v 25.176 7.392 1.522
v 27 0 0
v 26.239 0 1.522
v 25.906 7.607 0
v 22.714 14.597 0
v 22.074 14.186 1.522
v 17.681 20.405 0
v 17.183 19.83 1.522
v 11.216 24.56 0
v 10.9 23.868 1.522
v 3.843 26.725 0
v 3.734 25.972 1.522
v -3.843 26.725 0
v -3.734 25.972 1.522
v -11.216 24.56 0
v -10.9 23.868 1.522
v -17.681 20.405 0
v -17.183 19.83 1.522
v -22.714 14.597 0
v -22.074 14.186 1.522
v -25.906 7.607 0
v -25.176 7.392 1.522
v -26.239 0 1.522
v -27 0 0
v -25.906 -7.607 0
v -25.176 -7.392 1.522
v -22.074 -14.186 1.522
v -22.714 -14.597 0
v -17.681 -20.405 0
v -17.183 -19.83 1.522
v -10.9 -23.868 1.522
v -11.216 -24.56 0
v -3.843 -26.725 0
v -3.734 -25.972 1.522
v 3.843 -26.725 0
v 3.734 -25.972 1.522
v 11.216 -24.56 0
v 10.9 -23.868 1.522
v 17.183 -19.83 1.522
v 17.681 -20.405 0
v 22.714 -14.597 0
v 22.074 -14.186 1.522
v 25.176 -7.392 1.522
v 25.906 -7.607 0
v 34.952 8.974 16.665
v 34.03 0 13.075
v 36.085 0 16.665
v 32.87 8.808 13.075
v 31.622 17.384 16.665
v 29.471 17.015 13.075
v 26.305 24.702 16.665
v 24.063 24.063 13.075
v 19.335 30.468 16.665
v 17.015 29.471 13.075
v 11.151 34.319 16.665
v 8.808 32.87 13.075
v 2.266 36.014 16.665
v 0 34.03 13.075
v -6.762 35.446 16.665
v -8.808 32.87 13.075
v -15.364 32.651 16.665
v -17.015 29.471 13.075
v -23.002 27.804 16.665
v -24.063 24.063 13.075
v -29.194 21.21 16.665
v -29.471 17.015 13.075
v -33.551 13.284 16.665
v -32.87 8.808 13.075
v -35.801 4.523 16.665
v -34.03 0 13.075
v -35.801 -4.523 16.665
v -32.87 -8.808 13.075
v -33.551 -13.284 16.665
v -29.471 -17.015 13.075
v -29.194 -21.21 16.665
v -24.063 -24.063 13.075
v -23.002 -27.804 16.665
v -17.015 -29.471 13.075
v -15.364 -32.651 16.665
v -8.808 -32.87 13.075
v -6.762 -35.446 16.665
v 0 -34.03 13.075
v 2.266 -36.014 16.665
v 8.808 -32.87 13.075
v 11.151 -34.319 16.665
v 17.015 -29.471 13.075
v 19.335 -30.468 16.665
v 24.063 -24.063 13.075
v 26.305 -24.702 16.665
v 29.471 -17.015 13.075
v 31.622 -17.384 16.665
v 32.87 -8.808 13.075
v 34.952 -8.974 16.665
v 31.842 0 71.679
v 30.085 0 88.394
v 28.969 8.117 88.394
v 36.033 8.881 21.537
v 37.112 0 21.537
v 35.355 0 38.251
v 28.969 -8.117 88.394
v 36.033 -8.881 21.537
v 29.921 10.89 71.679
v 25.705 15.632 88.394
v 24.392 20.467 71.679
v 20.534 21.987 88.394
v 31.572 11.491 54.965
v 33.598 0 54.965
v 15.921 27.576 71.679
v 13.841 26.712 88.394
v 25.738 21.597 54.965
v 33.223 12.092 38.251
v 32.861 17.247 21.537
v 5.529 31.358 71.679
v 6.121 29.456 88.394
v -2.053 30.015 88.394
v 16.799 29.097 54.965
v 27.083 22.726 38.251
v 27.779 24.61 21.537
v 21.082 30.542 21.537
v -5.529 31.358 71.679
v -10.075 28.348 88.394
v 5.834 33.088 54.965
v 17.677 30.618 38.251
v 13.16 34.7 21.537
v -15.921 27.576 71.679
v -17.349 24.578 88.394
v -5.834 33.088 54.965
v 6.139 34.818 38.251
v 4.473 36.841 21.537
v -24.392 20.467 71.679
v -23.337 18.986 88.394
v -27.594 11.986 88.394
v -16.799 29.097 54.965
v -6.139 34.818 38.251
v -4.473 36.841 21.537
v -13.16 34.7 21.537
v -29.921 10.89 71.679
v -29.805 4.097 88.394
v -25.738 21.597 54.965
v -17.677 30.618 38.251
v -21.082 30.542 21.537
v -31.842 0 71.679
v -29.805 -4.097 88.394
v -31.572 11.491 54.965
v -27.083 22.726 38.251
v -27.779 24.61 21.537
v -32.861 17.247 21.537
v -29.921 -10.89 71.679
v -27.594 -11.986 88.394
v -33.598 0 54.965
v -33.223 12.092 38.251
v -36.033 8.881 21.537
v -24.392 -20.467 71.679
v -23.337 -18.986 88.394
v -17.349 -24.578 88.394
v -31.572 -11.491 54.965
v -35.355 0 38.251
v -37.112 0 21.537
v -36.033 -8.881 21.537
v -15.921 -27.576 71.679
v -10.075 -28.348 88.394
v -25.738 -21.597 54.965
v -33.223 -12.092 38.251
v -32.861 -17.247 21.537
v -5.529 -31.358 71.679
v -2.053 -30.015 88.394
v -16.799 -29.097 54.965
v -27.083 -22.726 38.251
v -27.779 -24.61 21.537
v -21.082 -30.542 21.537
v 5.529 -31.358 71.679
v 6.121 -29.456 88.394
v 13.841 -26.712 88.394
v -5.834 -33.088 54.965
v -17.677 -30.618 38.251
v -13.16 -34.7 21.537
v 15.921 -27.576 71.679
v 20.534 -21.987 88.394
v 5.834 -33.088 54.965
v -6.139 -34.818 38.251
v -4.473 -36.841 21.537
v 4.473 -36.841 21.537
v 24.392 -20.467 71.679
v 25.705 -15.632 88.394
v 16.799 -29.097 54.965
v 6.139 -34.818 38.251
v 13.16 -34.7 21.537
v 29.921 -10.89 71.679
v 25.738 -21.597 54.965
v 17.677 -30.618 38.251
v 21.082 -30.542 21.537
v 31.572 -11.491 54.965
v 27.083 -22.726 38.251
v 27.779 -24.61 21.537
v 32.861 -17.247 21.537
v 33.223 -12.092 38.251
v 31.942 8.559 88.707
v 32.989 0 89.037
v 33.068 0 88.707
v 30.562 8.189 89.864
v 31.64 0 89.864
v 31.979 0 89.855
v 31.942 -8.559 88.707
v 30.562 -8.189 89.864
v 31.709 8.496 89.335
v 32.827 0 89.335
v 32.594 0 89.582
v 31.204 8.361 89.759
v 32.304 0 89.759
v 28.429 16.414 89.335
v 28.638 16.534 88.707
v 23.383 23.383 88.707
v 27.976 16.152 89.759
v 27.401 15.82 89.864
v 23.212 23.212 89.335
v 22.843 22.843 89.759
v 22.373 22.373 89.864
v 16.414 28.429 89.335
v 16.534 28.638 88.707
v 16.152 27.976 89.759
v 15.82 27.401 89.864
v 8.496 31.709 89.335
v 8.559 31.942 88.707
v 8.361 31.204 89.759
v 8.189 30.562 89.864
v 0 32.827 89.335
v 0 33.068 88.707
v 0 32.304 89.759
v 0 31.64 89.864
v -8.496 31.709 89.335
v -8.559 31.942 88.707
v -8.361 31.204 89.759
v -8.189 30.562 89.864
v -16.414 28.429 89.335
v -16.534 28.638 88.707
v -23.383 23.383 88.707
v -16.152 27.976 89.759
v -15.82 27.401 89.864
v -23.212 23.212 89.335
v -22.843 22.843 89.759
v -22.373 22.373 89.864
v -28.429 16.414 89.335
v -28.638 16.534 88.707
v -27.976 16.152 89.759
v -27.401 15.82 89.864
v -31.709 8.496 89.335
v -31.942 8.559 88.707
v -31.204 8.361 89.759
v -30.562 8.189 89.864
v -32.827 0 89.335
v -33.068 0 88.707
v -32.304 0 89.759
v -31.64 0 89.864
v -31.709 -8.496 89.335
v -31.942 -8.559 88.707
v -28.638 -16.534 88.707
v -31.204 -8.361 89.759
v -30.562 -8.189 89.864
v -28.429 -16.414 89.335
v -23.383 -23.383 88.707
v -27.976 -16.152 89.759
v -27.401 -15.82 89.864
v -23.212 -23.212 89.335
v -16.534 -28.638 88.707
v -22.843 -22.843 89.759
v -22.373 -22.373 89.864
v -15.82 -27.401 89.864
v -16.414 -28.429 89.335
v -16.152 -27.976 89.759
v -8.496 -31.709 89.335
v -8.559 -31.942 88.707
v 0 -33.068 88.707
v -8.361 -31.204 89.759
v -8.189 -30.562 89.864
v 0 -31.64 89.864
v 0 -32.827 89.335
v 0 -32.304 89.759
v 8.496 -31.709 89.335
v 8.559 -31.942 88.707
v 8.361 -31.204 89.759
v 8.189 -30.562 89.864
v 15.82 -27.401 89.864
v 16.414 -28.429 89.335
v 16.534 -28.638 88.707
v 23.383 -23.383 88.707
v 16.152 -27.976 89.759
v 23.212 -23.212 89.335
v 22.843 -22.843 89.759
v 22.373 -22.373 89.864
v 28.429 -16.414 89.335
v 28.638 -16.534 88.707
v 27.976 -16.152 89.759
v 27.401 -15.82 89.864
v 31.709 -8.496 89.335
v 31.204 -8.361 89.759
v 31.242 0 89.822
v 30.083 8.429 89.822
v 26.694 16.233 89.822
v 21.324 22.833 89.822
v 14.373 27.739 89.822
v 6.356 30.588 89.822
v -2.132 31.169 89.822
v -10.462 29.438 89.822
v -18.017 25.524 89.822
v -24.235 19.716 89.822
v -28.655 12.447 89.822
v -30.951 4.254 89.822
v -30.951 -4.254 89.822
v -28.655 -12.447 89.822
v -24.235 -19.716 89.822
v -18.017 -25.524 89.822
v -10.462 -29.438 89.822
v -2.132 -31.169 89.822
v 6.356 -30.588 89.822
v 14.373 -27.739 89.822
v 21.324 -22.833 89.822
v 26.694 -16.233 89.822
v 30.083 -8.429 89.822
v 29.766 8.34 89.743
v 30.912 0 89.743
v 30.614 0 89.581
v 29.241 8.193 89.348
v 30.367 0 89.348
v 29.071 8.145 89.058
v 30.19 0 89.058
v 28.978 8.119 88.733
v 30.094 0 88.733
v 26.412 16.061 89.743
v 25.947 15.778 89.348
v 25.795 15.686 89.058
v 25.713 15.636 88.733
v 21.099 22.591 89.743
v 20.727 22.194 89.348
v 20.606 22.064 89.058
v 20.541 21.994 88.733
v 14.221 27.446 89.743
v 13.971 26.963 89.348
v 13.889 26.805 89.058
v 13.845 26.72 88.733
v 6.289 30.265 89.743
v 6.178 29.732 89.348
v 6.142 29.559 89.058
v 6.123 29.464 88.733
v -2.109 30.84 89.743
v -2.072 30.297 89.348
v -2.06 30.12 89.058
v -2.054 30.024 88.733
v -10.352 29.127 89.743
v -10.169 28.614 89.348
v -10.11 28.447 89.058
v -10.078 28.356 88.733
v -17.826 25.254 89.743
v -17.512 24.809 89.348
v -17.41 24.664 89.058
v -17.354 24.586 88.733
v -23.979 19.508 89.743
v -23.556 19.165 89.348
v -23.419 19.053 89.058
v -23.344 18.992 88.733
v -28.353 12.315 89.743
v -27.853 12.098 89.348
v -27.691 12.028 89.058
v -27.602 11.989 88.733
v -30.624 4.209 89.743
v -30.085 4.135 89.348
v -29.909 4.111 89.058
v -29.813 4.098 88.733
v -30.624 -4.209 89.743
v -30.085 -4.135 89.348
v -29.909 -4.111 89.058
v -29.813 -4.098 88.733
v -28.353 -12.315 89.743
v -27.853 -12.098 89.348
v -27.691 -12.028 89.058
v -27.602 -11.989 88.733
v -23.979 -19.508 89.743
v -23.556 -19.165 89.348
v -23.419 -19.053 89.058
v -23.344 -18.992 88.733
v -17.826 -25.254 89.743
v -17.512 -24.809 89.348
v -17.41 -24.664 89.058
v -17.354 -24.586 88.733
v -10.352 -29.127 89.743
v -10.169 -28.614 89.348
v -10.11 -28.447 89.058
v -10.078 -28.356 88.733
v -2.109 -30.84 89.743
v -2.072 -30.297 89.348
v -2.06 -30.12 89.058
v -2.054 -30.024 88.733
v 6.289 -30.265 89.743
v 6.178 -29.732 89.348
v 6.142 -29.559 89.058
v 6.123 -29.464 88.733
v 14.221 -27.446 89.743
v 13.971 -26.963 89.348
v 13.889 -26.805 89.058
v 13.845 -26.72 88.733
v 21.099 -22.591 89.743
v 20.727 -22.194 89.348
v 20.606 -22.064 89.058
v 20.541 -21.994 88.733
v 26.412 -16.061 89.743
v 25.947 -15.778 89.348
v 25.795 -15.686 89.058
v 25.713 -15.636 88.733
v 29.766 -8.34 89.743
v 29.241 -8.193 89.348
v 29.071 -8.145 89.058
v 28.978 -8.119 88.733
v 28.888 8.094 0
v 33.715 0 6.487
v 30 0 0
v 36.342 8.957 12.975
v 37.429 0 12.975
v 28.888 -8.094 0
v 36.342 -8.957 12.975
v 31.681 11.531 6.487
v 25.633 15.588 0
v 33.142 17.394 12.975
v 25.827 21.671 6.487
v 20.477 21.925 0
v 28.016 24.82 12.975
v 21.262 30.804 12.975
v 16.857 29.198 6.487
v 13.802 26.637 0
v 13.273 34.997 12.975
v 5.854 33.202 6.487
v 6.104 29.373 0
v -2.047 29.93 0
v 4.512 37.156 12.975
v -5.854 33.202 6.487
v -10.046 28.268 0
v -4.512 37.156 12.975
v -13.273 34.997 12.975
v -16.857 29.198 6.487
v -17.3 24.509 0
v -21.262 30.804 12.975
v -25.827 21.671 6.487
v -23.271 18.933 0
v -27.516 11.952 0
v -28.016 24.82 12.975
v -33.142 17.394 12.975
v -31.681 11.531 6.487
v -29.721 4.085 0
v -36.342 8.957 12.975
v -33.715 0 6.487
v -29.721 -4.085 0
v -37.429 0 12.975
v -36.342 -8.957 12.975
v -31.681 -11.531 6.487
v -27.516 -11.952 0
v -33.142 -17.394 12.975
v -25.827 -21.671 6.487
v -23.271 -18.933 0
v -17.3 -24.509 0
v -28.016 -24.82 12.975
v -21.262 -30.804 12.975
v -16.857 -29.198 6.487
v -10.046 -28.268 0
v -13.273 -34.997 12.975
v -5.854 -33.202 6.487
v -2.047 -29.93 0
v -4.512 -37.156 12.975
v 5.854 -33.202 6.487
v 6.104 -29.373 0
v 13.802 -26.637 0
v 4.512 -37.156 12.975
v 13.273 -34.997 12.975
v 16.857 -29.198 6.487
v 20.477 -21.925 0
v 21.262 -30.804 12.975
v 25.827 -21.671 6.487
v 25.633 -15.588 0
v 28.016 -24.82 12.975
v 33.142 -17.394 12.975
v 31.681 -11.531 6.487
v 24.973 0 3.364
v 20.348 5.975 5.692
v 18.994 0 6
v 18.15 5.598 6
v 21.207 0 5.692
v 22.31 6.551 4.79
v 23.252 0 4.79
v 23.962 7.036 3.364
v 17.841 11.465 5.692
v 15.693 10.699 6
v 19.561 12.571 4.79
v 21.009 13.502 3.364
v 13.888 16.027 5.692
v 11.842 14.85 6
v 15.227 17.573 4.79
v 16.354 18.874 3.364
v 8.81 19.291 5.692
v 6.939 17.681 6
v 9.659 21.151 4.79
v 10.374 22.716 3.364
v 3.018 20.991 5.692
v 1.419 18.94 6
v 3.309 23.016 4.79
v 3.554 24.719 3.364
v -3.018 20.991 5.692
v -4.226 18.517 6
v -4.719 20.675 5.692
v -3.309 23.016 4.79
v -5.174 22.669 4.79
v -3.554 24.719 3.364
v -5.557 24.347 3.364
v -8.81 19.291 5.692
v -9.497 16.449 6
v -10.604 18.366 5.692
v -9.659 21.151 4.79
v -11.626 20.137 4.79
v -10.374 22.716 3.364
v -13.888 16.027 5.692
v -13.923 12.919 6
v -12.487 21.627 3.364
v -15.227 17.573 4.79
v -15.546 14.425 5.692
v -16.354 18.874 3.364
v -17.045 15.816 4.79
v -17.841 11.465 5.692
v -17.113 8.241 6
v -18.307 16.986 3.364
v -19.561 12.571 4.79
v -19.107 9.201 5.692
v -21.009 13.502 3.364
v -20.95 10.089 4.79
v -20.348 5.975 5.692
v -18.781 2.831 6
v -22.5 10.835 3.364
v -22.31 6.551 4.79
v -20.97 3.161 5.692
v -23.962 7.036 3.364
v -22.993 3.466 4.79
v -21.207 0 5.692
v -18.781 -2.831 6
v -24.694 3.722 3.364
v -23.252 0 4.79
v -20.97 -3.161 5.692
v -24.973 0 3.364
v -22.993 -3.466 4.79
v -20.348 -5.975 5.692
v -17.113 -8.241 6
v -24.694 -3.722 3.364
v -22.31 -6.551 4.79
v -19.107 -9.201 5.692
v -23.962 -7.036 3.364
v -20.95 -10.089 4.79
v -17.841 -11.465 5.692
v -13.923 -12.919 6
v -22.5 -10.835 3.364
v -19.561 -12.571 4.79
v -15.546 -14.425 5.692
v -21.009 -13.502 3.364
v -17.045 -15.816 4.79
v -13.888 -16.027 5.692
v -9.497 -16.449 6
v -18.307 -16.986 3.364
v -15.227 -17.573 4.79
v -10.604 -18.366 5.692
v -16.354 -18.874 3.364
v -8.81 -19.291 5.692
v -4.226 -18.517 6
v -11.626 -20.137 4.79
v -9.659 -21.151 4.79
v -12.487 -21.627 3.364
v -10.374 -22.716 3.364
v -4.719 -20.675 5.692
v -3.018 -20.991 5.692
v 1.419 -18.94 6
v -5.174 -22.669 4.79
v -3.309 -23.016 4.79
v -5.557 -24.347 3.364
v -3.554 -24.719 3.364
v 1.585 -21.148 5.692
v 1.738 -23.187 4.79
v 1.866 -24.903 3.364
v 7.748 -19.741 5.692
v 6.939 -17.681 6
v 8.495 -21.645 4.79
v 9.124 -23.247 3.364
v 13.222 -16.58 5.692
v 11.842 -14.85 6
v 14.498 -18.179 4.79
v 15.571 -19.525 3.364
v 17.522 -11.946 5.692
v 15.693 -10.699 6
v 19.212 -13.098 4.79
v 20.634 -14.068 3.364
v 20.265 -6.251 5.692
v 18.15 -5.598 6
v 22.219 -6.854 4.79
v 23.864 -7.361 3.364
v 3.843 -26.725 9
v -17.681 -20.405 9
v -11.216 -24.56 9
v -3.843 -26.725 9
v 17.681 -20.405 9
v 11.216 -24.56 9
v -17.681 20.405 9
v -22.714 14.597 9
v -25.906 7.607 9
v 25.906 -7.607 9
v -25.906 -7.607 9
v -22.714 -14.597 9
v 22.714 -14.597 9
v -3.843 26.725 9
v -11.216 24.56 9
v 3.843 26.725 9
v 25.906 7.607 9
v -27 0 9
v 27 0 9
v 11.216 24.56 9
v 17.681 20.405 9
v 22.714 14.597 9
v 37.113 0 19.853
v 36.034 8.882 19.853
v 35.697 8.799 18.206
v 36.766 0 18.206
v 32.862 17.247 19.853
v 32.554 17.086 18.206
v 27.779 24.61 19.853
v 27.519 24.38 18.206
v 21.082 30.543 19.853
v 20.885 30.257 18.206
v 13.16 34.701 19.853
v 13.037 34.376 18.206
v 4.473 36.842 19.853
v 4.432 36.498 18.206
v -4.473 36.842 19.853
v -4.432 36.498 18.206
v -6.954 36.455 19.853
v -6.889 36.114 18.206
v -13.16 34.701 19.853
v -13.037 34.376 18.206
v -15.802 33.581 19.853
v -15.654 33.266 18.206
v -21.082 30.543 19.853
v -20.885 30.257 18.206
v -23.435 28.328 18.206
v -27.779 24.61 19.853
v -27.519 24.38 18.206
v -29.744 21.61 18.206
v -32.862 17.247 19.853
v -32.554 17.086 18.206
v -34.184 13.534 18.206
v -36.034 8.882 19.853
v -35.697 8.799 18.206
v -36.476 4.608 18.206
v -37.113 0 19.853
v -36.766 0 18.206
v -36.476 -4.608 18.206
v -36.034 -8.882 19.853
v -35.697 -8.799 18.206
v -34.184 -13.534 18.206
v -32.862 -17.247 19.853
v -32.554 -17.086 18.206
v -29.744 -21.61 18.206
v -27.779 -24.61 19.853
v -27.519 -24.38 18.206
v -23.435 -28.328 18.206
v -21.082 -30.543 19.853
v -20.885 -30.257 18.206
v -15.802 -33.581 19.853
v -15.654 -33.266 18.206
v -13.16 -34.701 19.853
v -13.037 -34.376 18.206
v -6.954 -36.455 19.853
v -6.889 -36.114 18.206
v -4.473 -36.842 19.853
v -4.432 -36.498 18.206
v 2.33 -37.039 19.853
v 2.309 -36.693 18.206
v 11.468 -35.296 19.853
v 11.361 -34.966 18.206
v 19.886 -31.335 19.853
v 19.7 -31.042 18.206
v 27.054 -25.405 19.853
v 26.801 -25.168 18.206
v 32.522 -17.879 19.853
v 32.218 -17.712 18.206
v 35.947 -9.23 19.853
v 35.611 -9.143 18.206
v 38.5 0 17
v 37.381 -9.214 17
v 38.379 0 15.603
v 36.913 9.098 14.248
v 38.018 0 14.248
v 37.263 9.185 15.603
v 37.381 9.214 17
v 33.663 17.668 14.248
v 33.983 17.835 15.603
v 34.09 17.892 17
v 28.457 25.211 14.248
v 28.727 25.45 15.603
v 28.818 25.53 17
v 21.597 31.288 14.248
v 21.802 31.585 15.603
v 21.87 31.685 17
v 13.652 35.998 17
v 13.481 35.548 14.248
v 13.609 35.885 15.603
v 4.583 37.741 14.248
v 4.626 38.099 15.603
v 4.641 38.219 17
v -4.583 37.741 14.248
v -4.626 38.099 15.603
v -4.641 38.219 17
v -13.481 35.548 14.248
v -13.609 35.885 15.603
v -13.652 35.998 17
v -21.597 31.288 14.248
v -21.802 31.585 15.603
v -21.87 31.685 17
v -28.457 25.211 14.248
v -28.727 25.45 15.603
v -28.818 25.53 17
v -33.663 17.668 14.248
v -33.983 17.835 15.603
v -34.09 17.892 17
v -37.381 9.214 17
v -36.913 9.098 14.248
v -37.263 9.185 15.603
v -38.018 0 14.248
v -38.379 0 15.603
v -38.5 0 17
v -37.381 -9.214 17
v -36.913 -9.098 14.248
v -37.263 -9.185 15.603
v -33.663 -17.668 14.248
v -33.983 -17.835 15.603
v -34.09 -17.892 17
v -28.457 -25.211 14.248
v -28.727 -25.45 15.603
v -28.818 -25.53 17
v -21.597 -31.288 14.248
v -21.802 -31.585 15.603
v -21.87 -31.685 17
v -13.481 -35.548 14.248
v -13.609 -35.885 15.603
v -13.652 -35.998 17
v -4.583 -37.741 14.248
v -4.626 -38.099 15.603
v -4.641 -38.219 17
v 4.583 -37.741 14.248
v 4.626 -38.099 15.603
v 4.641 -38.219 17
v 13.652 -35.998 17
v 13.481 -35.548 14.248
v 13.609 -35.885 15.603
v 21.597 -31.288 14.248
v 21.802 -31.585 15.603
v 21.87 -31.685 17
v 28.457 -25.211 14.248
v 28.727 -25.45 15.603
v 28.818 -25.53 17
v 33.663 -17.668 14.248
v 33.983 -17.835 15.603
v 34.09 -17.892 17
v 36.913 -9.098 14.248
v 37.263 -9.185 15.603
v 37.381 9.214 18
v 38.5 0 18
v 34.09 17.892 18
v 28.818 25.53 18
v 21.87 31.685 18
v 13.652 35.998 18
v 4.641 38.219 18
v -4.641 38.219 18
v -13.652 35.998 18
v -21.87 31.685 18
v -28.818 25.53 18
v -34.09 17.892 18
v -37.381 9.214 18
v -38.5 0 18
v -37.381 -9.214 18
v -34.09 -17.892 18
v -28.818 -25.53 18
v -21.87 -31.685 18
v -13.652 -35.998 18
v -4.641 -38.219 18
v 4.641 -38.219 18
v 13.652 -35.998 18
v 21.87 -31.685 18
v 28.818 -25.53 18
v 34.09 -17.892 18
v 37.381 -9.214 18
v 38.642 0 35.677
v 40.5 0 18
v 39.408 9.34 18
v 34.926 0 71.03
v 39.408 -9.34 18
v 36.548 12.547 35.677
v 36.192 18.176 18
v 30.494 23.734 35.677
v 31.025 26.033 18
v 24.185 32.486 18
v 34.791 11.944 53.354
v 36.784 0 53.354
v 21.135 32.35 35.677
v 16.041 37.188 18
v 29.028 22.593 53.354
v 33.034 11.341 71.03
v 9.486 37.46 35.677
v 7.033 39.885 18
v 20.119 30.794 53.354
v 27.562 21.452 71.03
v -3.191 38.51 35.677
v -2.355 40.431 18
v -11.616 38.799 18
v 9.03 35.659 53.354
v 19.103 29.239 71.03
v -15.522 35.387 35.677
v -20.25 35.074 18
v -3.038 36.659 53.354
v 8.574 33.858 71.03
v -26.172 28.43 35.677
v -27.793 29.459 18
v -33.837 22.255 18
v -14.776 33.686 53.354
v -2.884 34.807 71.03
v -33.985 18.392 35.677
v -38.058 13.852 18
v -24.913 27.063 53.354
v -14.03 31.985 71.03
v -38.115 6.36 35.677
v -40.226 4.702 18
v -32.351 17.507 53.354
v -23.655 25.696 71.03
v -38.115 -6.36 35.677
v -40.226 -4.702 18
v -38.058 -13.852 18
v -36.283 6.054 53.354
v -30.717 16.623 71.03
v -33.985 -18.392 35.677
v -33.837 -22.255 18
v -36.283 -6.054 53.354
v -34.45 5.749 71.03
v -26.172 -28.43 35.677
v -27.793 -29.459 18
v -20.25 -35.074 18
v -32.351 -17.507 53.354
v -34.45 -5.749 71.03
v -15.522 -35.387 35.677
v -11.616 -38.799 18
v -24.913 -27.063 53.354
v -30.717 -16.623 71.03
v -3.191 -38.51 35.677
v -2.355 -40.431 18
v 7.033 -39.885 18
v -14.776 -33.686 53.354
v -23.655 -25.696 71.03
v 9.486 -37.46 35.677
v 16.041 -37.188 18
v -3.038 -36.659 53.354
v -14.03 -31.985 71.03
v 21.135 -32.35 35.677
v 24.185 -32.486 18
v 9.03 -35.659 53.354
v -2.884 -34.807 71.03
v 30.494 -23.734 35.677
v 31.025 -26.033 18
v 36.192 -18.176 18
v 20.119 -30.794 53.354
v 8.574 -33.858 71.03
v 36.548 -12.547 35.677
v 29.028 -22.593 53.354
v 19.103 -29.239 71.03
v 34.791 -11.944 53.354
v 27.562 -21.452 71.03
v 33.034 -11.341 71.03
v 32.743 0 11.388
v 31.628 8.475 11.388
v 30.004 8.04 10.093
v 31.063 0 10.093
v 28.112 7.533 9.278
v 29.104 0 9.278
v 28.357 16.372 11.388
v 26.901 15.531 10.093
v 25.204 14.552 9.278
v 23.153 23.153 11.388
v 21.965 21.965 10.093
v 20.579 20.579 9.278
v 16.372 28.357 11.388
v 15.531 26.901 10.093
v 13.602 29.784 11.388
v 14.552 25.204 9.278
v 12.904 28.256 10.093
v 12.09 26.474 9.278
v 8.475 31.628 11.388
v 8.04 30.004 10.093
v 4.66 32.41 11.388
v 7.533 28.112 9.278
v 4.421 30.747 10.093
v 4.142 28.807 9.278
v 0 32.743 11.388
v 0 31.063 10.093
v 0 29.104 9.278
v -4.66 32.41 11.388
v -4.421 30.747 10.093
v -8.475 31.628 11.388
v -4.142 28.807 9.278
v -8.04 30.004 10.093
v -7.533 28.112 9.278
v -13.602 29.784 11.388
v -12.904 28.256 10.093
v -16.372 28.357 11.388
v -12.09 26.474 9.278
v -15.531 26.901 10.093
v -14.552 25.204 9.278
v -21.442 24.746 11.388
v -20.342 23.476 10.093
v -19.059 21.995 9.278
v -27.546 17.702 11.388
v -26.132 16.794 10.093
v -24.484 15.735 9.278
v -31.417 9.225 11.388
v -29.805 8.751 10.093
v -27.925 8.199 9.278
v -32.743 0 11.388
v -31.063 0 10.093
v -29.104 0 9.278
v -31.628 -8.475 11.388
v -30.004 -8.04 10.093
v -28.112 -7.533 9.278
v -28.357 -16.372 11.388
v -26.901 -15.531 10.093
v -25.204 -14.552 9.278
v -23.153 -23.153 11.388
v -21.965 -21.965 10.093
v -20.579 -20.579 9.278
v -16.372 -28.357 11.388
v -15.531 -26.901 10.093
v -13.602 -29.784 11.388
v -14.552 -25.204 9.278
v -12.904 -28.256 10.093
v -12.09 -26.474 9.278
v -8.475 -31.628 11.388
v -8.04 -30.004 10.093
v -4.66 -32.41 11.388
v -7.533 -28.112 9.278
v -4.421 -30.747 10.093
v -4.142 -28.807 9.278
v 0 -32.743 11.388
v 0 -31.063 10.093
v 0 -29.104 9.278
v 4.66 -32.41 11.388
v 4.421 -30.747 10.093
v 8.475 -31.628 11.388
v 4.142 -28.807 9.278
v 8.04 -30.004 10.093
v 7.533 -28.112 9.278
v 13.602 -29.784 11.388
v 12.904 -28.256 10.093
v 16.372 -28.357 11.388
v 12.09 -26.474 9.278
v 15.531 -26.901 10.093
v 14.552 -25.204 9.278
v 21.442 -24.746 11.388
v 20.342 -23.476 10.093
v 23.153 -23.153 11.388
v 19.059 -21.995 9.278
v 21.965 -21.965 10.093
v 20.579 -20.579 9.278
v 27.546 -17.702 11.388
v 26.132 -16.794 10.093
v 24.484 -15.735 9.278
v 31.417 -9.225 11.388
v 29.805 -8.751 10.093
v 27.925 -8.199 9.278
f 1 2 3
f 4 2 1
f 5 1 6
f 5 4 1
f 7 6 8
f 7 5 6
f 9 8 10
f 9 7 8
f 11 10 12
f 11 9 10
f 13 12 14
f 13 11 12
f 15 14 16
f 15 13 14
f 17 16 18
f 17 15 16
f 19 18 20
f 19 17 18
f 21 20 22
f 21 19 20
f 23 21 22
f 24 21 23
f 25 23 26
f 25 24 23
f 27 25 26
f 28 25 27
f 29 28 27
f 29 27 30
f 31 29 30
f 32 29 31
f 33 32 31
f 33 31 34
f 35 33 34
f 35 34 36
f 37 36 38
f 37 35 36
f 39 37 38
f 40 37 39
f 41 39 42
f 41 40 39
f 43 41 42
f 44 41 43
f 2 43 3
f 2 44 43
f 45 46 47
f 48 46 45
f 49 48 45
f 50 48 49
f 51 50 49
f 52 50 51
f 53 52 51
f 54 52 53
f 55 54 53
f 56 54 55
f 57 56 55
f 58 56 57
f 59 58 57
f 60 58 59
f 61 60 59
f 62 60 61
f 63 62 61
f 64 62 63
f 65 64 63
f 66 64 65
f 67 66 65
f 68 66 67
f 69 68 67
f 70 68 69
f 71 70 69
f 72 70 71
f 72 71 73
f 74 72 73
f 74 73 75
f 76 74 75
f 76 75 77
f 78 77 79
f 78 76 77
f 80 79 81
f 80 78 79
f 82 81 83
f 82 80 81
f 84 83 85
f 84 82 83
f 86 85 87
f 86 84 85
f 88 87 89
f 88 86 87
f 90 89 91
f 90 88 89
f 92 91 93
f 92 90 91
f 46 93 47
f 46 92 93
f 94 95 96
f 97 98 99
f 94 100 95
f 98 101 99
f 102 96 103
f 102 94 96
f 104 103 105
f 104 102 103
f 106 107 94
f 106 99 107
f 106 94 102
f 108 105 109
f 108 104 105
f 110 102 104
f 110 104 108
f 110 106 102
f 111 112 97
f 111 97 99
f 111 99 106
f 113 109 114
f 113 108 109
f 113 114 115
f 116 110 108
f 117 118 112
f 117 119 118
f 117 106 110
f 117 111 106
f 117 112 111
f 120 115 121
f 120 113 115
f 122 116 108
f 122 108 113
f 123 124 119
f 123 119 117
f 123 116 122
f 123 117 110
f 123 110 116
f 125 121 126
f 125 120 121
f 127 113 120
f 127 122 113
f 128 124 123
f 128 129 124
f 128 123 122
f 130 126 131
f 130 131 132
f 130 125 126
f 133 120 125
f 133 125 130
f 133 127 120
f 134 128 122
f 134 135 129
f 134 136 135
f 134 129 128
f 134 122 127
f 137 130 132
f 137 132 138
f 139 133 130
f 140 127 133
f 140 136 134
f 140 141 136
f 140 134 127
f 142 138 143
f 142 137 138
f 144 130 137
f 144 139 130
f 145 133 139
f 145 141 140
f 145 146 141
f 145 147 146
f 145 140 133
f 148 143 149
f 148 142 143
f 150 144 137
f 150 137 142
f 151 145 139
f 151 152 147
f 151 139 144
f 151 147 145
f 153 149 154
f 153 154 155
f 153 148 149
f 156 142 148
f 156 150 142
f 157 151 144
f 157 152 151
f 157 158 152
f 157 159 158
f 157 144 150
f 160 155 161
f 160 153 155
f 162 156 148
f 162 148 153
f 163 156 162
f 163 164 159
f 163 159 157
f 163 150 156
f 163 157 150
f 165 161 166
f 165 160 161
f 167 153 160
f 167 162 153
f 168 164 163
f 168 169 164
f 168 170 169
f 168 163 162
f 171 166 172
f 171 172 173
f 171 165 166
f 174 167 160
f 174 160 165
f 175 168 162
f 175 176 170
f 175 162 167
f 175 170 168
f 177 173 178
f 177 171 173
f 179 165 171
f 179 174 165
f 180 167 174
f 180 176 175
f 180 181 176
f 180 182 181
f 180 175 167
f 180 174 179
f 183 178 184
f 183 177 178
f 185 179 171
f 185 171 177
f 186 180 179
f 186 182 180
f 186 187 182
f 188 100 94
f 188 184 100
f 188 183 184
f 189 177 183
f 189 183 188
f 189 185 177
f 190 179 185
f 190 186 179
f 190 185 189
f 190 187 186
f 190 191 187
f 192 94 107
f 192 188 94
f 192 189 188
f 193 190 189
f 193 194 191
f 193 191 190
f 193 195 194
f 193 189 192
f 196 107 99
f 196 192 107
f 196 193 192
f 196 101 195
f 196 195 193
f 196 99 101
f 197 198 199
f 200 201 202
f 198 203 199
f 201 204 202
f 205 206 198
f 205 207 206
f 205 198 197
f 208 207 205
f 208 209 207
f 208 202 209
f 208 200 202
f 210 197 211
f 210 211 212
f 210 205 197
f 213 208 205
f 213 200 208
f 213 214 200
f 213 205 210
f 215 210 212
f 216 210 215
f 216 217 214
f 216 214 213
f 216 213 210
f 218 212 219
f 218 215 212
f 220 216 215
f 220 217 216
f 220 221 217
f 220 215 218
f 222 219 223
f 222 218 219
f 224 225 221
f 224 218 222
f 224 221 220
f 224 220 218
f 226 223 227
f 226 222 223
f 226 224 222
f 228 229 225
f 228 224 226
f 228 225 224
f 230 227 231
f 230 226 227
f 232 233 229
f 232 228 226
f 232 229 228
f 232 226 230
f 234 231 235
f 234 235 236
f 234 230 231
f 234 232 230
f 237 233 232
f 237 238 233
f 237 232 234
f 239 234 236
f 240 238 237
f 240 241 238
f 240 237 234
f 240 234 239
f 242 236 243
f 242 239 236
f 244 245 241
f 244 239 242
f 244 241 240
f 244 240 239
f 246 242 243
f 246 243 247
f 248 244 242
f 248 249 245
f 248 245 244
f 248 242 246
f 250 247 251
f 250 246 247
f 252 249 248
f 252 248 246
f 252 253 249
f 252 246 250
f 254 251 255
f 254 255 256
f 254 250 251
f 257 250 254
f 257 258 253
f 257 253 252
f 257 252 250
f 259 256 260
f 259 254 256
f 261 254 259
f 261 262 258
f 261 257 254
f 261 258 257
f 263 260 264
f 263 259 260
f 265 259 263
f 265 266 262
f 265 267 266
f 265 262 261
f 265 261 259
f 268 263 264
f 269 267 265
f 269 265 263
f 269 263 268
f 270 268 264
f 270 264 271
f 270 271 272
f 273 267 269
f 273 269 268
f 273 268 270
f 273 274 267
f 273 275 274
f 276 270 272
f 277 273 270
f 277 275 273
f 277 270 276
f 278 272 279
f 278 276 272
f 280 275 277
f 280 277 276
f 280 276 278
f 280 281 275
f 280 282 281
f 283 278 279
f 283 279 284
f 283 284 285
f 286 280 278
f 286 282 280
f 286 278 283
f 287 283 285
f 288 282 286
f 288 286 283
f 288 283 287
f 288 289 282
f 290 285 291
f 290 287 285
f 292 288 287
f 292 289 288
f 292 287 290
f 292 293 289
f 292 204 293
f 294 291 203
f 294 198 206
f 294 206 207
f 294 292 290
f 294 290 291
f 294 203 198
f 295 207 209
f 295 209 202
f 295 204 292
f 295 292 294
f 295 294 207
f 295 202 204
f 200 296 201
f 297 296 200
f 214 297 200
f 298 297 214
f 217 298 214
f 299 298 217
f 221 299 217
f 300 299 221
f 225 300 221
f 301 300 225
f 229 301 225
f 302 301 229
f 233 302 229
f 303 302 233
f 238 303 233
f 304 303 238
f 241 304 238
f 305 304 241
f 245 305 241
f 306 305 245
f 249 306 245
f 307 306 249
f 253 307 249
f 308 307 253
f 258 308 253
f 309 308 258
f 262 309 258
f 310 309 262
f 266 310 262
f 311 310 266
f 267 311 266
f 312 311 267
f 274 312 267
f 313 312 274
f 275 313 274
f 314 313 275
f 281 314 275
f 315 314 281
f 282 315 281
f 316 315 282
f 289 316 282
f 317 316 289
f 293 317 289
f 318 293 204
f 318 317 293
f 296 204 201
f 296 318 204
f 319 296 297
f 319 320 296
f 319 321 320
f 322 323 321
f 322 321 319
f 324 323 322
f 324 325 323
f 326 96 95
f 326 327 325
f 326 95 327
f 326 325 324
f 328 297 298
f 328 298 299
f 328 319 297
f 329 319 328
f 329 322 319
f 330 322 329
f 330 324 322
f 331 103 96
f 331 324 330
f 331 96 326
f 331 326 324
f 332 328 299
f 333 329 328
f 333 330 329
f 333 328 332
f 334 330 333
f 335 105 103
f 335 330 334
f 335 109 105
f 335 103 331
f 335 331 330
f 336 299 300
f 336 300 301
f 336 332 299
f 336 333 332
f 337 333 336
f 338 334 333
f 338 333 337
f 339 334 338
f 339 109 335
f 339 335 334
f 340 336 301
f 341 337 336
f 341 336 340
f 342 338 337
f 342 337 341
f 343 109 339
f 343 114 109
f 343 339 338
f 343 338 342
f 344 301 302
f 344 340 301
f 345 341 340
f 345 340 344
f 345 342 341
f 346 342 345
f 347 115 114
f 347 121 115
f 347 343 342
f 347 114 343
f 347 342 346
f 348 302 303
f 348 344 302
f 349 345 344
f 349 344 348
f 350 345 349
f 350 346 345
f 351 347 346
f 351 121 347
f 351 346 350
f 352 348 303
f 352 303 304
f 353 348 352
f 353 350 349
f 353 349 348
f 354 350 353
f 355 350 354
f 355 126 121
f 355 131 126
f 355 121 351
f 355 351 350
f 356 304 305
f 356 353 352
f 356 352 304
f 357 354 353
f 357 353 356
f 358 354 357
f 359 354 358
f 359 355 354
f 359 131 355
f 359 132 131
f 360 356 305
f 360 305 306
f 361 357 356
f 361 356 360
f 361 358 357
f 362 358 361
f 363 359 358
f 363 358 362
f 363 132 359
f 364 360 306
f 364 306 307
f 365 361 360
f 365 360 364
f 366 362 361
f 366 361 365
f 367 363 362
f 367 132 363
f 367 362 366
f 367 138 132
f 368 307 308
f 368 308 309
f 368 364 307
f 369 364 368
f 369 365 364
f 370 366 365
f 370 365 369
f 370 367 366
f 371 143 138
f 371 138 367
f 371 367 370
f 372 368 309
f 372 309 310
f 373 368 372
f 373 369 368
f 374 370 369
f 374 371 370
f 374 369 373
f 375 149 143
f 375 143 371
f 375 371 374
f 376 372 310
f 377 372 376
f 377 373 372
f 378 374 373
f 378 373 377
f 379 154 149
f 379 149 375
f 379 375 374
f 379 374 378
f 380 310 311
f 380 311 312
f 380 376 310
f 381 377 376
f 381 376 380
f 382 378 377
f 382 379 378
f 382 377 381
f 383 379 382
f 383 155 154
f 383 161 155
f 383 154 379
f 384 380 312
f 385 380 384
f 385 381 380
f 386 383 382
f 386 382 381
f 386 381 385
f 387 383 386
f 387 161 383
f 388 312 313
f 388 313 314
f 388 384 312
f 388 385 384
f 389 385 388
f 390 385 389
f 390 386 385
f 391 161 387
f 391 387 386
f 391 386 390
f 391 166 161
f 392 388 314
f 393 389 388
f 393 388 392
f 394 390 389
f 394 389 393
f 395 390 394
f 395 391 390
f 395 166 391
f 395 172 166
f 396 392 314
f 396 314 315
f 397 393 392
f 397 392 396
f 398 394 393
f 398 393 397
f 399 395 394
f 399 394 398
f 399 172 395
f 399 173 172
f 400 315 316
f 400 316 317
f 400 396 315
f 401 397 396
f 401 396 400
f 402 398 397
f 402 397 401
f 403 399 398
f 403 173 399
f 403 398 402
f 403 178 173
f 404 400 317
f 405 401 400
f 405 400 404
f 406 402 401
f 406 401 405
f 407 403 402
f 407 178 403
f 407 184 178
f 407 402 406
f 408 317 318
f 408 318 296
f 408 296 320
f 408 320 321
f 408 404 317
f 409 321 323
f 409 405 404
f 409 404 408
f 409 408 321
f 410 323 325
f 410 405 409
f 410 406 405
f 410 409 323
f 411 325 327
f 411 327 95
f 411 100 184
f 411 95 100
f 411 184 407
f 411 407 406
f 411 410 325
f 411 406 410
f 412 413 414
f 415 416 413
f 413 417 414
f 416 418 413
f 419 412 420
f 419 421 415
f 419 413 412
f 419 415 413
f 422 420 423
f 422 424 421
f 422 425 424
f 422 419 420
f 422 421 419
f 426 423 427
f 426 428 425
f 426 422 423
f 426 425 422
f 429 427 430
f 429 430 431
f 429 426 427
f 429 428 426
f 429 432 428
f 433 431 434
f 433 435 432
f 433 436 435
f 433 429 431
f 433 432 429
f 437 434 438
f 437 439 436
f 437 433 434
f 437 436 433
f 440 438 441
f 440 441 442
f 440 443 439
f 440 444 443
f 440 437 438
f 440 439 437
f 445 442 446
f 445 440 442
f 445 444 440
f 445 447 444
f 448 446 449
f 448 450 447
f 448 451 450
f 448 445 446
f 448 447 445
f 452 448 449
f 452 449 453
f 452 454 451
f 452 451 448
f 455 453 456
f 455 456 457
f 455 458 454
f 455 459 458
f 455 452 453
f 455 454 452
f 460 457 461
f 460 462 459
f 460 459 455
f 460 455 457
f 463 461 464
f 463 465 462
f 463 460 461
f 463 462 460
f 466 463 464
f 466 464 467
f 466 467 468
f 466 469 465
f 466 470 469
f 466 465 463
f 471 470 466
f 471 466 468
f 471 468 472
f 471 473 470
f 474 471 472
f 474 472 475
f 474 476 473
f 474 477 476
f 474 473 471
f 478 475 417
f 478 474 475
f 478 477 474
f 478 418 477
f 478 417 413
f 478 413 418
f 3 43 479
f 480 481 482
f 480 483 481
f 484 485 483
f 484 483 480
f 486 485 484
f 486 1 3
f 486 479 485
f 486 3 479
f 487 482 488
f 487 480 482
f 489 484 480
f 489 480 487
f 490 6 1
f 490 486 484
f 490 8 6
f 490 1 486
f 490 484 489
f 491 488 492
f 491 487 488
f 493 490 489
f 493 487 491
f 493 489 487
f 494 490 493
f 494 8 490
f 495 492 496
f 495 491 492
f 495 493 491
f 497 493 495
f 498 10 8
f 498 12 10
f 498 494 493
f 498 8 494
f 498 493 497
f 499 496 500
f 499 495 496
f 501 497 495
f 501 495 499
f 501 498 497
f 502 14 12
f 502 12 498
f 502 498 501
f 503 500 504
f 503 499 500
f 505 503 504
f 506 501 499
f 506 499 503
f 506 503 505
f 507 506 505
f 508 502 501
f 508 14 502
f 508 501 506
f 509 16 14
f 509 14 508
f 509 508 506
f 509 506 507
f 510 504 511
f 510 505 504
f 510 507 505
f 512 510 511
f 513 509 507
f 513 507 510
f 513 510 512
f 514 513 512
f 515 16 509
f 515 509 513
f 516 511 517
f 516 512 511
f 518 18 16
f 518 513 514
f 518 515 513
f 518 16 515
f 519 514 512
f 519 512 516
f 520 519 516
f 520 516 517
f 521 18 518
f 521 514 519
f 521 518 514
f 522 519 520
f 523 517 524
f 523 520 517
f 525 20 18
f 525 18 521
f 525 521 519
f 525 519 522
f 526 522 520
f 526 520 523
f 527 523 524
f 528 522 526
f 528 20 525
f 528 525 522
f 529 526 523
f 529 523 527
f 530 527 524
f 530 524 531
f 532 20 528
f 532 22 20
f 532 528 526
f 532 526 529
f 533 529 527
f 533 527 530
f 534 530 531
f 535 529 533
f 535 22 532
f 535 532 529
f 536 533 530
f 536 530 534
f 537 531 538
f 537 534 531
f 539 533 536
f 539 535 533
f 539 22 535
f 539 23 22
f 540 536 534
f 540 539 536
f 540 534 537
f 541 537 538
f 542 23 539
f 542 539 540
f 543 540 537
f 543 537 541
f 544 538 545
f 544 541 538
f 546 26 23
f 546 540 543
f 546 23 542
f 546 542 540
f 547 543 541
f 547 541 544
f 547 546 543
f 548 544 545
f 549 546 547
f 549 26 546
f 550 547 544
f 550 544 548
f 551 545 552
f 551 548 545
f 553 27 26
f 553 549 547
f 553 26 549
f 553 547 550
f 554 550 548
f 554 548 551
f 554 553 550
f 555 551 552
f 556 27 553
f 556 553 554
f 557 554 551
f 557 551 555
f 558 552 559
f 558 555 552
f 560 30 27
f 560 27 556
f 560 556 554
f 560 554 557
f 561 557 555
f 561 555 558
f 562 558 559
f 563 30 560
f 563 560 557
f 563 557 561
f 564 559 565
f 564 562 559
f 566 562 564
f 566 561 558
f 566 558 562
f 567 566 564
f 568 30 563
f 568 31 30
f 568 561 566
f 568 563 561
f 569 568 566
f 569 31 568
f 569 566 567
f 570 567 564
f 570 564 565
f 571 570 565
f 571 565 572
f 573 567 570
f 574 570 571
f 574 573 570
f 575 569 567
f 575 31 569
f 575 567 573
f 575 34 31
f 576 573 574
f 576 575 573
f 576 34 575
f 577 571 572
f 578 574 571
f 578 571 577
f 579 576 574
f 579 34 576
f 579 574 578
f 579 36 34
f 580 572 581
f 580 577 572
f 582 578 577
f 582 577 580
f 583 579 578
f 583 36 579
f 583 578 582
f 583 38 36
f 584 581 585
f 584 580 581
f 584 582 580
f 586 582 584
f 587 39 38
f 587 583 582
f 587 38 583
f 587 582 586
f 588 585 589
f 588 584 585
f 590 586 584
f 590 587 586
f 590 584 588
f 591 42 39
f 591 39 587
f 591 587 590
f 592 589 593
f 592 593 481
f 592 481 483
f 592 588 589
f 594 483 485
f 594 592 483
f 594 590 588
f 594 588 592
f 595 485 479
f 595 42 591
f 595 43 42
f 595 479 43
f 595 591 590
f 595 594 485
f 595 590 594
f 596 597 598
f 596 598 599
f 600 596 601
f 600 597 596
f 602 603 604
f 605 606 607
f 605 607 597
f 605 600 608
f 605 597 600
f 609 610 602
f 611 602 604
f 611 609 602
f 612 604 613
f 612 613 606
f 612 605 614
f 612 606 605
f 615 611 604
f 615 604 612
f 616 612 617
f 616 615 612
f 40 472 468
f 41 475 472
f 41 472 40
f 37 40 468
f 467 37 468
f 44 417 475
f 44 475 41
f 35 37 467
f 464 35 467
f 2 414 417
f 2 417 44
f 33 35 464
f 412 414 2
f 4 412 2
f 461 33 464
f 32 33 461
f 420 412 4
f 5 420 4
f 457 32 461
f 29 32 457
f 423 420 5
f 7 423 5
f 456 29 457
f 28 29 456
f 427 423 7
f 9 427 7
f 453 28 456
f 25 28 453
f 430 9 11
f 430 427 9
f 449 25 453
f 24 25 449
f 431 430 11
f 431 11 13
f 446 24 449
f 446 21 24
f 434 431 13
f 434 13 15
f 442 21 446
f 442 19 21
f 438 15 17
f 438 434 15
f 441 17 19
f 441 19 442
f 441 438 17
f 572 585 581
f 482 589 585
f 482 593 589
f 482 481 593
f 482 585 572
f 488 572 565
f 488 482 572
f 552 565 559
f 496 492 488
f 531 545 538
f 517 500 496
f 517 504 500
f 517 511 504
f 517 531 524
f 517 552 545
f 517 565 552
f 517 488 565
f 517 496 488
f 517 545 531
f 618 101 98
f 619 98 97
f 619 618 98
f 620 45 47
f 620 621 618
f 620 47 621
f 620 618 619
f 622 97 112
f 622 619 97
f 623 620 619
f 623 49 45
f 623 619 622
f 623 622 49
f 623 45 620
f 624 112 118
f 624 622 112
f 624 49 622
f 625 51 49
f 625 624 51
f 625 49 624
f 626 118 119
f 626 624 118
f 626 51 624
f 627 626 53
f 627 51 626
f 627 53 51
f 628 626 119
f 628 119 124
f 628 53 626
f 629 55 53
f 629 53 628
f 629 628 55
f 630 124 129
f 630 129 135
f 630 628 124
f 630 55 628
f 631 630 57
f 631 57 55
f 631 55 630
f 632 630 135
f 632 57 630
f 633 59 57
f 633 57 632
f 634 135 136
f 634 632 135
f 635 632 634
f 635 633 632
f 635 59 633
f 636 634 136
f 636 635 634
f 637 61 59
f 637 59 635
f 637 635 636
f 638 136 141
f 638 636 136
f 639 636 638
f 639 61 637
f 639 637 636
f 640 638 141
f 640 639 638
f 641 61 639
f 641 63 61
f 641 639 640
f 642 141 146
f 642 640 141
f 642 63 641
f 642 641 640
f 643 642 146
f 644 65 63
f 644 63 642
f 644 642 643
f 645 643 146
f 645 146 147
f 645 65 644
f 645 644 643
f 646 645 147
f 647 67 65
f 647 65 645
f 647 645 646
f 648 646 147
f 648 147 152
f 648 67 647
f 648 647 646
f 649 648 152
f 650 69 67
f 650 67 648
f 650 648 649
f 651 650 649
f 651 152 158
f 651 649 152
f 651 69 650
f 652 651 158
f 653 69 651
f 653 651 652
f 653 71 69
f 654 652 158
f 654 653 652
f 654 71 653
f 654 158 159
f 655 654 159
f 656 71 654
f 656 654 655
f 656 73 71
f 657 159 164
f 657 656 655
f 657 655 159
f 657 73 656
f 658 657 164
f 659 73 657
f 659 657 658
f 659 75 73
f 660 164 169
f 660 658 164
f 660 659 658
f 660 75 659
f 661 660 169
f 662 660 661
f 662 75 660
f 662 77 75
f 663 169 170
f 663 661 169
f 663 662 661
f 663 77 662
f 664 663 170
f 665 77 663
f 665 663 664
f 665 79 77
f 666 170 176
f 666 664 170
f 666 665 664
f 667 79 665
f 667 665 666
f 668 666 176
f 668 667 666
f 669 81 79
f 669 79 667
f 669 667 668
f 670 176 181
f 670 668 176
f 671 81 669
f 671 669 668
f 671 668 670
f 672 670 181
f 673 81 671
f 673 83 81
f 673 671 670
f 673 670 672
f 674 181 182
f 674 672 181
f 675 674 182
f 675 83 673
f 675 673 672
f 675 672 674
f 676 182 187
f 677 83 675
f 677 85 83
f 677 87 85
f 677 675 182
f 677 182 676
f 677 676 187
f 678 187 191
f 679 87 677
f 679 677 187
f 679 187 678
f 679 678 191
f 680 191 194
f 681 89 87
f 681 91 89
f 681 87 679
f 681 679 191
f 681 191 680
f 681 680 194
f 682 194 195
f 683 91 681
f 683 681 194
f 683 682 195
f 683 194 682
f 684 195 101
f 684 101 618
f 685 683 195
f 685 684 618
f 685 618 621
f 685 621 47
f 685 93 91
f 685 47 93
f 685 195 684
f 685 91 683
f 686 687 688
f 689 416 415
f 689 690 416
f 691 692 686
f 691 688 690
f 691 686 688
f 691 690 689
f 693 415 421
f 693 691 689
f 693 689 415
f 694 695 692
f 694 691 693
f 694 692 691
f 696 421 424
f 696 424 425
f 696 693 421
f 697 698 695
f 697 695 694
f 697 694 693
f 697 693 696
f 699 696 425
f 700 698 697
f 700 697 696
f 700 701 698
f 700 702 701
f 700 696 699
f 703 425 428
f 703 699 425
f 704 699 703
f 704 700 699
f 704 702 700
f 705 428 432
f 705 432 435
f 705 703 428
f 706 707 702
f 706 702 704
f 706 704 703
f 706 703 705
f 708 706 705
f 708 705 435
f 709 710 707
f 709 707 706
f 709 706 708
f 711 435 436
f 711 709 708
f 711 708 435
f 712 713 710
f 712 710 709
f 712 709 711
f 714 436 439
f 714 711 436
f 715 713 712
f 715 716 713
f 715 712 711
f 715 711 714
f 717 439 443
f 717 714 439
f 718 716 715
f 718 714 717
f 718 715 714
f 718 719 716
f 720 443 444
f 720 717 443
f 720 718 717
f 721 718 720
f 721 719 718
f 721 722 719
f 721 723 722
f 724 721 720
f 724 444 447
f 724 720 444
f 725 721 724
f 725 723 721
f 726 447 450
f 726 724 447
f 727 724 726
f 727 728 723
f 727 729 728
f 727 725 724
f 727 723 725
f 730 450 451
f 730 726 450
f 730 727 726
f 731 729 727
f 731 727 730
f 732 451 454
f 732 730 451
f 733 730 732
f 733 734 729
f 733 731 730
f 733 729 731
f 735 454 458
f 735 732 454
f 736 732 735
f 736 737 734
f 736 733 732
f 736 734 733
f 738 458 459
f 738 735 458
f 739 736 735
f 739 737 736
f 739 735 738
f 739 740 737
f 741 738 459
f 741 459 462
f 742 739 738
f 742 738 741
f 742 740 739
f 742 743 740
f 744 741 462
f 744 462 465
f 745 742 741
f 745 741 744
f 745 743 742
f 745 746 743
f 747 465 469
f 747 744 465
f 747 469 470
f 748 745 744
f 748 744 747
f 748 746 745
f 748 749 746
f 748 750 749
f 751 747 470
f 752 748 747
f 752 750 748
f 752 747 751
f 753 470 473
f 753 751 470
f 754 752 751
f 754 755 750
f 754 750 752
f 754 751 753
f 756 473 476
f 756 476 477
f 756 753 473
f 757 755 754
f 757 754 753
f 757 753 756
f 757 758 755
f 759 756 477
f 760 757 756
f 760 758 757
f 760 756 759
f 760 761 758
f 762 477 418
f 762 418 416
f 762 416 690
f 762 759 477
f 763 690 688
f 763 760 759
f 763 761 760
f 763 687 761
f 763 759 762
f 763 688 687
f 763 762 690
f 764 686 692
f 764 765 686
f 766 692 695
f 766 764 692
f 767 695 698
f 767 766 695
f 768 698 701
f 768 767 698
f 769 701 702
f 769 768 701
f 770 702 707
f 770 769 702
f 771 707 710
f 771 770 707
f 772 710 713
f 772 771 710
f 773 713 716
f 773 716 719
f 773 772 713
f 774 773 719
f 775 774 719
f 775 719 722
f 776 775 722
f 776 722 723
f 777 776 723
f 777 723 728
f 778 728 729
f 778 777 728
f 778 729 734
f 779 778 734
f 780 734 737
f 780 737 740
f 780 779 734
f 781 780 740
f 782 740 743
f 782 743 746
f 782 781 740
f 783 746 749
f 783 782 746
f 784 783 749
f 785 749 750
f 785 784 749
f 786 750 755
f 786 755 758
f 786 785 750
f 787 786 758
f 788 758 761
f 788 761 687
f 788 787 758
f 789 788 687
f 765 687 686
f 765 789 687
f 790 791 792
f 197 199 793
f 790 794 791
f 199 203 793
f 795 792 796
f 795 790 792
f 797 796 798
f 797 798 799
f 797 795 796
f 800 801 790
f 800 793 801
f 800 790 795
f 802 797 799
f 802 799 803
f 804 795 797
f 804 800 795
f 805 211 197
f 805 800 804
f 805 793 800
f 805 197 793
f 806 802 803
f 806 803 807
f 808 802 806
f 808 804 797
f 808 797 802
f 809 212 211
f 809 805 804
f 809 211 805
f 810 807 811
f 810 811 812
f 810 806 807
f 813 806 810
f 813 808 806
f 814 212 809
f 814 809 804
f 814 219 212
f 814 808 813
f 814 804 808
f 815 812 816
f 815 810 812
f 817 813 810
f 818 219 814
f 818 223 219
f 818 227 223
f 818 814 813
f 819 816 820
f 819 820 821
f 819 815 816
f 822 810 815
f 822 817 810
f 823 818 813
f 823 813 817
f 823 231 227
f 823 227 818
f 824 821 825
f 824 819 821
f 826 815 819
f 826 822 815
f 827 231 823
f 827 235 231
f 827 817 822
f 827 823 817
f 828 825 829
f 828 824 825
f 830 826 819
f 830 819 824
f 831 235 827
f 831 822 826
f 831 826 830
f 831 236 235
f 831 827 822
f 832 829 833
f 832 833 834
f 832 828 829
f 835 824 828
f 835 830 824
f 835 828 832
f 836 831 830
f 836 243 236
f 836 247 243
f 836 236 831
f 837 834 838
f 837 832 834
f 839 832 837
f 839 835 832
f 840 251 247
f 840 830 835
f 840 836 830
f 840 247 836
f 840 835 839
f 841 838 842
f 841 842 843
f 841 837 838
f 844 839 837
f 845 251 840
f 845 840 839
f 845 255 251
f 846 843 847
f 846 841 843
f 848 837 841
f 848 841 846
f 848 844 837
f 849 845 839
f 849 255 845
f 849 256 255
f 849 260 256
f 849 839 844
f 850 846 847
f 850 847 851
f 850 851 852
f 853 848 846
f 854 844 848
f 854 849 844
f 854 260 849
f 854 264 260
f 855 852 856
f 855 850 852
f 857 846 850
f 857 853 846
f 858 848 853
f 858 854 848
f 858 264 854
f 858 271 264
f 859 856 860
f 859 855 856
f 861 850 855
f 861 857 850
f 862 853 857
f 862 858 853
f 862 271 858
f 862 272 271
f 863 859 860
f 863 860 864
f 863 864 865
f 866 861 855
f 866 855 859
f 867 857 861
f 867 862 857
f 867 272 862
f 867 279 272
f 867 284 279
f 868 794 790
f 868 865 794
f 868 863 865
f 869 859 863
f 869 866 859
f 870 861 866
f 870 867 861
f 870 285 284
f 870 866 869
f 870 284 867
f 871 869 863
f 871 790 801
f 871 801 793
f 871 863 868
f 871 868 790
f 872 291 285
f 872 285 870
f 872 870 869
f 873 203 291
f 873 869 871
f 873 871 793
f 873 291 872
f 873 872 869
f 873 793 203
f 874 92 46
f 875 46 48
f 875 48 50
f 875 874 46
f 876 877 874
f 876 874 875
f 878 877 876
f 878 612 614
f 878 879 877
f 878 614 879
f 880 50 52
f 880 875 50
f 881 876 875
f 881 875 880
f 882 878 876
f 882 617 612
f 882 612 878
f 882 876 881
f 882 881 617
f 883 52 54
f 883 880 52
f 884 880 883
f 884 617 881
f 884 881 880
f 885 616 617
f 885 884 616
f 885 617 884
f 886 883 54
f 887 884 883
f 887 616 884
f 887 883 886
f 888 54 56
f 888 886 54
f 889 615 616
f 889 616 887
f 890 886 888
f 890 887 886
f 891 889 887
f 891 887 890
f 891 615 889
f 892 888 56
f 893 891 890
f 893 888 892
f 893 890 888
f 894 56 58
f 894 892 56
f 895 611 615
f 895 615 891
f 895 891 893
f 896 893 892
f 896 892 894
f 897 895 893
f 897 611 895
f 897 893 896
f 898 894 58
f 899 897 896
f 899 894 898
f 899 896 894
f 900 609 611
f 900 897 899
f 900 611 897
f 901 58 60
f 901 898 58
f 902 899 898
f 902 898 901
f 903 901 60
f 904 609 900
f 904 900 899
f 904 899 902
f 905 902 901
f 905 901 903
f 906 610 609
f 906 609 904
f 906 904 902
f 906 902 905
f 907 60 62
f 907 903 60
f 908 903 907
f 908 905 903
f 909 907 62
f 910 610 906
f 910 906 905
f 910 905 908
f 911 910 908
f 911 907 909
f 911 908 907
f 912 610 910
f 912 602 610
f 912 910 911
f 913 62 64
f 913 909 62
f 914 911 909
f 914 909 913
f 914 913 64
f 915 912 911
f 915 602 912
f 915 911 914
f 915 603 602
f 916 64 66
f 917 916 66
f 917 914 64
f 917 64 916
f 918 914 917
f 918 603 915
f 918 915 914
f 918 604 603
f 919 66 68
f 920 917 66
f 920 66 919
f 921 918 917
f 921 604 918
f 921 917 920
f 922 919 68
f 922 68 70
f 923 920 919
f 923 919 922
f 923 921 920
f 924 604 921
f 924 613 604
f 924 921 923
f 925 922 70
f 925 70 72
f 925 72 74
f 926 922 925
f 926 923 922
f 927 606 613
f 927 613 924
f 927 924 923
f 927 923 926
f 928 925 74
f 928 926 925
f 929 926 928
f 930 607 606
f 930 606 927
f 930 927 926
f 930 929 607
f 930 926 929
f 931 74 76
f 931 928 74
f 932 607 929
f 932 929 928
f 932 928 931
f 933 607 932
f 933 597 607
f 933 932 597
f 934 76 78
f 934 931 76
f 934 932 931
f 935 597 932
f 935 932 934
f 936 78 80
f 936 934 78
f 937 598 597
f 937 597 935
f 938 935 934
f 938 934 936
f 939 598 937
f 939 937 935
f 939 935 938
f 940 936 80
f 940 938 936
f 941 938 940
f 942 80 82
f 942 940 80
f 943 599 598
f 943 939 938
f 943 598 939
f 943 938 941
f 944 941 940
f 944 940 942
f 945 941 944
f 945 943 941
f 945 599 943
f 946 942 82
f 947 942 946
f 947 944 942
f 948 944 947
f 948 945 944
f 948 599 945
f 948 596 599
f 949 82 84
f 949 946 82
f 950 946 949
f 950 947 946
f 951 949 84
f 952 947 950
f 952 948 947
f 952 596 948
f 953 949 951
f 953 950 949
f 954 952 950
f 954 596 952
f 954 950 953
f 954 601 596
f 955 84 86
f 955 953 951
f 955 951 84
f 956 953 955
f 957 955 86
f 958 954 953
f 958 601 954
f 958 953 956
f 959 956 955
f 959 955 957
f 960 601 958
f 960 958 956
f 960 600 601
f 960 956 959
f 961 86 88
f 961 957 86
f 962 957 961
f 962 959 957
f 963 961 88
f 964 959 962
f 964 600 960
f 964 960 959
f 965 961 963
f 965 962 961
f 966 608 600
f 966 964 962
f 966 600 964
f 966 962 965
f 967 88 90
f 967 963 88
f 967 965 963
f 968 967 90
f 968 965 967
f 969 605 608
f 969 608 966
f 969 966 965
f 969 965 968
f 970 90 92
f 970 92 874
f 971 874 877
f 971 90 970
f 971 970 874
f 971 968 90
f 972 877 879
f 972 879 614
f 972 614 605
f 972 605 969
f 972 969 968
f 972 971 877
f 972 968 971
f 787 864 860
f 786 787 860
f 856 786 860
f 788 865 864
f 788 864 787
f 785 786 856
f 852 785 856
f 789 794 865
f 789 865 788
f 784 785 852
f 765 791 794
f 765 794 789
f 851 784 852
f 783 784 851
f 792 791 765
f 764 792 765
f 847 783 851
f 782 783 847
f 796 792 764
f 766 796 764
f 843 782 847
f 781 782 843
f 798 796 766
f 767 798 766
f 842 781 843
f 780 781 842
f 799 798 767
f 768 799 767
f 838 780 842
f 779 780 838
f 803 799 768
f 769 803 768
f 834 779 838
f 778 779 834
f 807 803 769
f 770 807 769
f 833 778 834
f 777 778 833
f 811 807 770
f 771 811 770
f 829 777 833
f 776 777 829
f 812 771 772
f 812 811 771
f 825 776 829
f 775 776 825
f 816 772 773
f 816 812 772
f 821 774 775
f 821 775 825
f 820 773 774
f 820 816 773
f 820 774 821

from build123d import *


with BuildPart() as f1:
    # F0 (on Front) → F1 (revolve)
    with BuildSketch(Plane.XZ):
        with BuildLine():
            Line((0, 9), (0, 6))
            Line((0, 6), (18.993515, 6))
            ThreePointArc((18.993515, 6), (23.252285, 4.790172), (26.238968, 1.522063))
            Line((26.238968, 1.522063), (27, 0))
            Line((27, 0), (30, 0))
            Line((30, 0), (37.42918, 12.974822))
            ThreePointArc((37.42918, 12.974822), (38.227719, 14.917411), (38.5, 17))
            Line((38.5, 17), (38.5, 18))
            Line((38.5, 18), (40.5, 18))
            Line((40.5, 18), (33.068382, 88.707122))
            ThreePointArc((33.068382, 88.707122), (32.59362, 89.581524), (31.639617, 89.864113))
            Line((31.639617, 89.864113), (31.241808, 89.822302))
            ThreePointArc((31.241808, 89.822302), (30.367405, 89.34754), (30.084816, 88.393536))
            Line((30.084816, 88.393536), (37.111707, 21.537138))
            ThreePointArc((37.111707, 21.537138), (36.982068, 19.020359), (36.085263, 16.66521))
            Line((36.085263, 16.66521), (34.029843, 13.075486))
            ThreePointArc((34.029843, 13.075486), (31.062889, 10.092548), (27, 9))
            Line((27, 9), (0, 9))
        make_face()
    revolve(axis=Axis((0, 0, 44.353561), (0, 0, 1)))


solid = f1.part
